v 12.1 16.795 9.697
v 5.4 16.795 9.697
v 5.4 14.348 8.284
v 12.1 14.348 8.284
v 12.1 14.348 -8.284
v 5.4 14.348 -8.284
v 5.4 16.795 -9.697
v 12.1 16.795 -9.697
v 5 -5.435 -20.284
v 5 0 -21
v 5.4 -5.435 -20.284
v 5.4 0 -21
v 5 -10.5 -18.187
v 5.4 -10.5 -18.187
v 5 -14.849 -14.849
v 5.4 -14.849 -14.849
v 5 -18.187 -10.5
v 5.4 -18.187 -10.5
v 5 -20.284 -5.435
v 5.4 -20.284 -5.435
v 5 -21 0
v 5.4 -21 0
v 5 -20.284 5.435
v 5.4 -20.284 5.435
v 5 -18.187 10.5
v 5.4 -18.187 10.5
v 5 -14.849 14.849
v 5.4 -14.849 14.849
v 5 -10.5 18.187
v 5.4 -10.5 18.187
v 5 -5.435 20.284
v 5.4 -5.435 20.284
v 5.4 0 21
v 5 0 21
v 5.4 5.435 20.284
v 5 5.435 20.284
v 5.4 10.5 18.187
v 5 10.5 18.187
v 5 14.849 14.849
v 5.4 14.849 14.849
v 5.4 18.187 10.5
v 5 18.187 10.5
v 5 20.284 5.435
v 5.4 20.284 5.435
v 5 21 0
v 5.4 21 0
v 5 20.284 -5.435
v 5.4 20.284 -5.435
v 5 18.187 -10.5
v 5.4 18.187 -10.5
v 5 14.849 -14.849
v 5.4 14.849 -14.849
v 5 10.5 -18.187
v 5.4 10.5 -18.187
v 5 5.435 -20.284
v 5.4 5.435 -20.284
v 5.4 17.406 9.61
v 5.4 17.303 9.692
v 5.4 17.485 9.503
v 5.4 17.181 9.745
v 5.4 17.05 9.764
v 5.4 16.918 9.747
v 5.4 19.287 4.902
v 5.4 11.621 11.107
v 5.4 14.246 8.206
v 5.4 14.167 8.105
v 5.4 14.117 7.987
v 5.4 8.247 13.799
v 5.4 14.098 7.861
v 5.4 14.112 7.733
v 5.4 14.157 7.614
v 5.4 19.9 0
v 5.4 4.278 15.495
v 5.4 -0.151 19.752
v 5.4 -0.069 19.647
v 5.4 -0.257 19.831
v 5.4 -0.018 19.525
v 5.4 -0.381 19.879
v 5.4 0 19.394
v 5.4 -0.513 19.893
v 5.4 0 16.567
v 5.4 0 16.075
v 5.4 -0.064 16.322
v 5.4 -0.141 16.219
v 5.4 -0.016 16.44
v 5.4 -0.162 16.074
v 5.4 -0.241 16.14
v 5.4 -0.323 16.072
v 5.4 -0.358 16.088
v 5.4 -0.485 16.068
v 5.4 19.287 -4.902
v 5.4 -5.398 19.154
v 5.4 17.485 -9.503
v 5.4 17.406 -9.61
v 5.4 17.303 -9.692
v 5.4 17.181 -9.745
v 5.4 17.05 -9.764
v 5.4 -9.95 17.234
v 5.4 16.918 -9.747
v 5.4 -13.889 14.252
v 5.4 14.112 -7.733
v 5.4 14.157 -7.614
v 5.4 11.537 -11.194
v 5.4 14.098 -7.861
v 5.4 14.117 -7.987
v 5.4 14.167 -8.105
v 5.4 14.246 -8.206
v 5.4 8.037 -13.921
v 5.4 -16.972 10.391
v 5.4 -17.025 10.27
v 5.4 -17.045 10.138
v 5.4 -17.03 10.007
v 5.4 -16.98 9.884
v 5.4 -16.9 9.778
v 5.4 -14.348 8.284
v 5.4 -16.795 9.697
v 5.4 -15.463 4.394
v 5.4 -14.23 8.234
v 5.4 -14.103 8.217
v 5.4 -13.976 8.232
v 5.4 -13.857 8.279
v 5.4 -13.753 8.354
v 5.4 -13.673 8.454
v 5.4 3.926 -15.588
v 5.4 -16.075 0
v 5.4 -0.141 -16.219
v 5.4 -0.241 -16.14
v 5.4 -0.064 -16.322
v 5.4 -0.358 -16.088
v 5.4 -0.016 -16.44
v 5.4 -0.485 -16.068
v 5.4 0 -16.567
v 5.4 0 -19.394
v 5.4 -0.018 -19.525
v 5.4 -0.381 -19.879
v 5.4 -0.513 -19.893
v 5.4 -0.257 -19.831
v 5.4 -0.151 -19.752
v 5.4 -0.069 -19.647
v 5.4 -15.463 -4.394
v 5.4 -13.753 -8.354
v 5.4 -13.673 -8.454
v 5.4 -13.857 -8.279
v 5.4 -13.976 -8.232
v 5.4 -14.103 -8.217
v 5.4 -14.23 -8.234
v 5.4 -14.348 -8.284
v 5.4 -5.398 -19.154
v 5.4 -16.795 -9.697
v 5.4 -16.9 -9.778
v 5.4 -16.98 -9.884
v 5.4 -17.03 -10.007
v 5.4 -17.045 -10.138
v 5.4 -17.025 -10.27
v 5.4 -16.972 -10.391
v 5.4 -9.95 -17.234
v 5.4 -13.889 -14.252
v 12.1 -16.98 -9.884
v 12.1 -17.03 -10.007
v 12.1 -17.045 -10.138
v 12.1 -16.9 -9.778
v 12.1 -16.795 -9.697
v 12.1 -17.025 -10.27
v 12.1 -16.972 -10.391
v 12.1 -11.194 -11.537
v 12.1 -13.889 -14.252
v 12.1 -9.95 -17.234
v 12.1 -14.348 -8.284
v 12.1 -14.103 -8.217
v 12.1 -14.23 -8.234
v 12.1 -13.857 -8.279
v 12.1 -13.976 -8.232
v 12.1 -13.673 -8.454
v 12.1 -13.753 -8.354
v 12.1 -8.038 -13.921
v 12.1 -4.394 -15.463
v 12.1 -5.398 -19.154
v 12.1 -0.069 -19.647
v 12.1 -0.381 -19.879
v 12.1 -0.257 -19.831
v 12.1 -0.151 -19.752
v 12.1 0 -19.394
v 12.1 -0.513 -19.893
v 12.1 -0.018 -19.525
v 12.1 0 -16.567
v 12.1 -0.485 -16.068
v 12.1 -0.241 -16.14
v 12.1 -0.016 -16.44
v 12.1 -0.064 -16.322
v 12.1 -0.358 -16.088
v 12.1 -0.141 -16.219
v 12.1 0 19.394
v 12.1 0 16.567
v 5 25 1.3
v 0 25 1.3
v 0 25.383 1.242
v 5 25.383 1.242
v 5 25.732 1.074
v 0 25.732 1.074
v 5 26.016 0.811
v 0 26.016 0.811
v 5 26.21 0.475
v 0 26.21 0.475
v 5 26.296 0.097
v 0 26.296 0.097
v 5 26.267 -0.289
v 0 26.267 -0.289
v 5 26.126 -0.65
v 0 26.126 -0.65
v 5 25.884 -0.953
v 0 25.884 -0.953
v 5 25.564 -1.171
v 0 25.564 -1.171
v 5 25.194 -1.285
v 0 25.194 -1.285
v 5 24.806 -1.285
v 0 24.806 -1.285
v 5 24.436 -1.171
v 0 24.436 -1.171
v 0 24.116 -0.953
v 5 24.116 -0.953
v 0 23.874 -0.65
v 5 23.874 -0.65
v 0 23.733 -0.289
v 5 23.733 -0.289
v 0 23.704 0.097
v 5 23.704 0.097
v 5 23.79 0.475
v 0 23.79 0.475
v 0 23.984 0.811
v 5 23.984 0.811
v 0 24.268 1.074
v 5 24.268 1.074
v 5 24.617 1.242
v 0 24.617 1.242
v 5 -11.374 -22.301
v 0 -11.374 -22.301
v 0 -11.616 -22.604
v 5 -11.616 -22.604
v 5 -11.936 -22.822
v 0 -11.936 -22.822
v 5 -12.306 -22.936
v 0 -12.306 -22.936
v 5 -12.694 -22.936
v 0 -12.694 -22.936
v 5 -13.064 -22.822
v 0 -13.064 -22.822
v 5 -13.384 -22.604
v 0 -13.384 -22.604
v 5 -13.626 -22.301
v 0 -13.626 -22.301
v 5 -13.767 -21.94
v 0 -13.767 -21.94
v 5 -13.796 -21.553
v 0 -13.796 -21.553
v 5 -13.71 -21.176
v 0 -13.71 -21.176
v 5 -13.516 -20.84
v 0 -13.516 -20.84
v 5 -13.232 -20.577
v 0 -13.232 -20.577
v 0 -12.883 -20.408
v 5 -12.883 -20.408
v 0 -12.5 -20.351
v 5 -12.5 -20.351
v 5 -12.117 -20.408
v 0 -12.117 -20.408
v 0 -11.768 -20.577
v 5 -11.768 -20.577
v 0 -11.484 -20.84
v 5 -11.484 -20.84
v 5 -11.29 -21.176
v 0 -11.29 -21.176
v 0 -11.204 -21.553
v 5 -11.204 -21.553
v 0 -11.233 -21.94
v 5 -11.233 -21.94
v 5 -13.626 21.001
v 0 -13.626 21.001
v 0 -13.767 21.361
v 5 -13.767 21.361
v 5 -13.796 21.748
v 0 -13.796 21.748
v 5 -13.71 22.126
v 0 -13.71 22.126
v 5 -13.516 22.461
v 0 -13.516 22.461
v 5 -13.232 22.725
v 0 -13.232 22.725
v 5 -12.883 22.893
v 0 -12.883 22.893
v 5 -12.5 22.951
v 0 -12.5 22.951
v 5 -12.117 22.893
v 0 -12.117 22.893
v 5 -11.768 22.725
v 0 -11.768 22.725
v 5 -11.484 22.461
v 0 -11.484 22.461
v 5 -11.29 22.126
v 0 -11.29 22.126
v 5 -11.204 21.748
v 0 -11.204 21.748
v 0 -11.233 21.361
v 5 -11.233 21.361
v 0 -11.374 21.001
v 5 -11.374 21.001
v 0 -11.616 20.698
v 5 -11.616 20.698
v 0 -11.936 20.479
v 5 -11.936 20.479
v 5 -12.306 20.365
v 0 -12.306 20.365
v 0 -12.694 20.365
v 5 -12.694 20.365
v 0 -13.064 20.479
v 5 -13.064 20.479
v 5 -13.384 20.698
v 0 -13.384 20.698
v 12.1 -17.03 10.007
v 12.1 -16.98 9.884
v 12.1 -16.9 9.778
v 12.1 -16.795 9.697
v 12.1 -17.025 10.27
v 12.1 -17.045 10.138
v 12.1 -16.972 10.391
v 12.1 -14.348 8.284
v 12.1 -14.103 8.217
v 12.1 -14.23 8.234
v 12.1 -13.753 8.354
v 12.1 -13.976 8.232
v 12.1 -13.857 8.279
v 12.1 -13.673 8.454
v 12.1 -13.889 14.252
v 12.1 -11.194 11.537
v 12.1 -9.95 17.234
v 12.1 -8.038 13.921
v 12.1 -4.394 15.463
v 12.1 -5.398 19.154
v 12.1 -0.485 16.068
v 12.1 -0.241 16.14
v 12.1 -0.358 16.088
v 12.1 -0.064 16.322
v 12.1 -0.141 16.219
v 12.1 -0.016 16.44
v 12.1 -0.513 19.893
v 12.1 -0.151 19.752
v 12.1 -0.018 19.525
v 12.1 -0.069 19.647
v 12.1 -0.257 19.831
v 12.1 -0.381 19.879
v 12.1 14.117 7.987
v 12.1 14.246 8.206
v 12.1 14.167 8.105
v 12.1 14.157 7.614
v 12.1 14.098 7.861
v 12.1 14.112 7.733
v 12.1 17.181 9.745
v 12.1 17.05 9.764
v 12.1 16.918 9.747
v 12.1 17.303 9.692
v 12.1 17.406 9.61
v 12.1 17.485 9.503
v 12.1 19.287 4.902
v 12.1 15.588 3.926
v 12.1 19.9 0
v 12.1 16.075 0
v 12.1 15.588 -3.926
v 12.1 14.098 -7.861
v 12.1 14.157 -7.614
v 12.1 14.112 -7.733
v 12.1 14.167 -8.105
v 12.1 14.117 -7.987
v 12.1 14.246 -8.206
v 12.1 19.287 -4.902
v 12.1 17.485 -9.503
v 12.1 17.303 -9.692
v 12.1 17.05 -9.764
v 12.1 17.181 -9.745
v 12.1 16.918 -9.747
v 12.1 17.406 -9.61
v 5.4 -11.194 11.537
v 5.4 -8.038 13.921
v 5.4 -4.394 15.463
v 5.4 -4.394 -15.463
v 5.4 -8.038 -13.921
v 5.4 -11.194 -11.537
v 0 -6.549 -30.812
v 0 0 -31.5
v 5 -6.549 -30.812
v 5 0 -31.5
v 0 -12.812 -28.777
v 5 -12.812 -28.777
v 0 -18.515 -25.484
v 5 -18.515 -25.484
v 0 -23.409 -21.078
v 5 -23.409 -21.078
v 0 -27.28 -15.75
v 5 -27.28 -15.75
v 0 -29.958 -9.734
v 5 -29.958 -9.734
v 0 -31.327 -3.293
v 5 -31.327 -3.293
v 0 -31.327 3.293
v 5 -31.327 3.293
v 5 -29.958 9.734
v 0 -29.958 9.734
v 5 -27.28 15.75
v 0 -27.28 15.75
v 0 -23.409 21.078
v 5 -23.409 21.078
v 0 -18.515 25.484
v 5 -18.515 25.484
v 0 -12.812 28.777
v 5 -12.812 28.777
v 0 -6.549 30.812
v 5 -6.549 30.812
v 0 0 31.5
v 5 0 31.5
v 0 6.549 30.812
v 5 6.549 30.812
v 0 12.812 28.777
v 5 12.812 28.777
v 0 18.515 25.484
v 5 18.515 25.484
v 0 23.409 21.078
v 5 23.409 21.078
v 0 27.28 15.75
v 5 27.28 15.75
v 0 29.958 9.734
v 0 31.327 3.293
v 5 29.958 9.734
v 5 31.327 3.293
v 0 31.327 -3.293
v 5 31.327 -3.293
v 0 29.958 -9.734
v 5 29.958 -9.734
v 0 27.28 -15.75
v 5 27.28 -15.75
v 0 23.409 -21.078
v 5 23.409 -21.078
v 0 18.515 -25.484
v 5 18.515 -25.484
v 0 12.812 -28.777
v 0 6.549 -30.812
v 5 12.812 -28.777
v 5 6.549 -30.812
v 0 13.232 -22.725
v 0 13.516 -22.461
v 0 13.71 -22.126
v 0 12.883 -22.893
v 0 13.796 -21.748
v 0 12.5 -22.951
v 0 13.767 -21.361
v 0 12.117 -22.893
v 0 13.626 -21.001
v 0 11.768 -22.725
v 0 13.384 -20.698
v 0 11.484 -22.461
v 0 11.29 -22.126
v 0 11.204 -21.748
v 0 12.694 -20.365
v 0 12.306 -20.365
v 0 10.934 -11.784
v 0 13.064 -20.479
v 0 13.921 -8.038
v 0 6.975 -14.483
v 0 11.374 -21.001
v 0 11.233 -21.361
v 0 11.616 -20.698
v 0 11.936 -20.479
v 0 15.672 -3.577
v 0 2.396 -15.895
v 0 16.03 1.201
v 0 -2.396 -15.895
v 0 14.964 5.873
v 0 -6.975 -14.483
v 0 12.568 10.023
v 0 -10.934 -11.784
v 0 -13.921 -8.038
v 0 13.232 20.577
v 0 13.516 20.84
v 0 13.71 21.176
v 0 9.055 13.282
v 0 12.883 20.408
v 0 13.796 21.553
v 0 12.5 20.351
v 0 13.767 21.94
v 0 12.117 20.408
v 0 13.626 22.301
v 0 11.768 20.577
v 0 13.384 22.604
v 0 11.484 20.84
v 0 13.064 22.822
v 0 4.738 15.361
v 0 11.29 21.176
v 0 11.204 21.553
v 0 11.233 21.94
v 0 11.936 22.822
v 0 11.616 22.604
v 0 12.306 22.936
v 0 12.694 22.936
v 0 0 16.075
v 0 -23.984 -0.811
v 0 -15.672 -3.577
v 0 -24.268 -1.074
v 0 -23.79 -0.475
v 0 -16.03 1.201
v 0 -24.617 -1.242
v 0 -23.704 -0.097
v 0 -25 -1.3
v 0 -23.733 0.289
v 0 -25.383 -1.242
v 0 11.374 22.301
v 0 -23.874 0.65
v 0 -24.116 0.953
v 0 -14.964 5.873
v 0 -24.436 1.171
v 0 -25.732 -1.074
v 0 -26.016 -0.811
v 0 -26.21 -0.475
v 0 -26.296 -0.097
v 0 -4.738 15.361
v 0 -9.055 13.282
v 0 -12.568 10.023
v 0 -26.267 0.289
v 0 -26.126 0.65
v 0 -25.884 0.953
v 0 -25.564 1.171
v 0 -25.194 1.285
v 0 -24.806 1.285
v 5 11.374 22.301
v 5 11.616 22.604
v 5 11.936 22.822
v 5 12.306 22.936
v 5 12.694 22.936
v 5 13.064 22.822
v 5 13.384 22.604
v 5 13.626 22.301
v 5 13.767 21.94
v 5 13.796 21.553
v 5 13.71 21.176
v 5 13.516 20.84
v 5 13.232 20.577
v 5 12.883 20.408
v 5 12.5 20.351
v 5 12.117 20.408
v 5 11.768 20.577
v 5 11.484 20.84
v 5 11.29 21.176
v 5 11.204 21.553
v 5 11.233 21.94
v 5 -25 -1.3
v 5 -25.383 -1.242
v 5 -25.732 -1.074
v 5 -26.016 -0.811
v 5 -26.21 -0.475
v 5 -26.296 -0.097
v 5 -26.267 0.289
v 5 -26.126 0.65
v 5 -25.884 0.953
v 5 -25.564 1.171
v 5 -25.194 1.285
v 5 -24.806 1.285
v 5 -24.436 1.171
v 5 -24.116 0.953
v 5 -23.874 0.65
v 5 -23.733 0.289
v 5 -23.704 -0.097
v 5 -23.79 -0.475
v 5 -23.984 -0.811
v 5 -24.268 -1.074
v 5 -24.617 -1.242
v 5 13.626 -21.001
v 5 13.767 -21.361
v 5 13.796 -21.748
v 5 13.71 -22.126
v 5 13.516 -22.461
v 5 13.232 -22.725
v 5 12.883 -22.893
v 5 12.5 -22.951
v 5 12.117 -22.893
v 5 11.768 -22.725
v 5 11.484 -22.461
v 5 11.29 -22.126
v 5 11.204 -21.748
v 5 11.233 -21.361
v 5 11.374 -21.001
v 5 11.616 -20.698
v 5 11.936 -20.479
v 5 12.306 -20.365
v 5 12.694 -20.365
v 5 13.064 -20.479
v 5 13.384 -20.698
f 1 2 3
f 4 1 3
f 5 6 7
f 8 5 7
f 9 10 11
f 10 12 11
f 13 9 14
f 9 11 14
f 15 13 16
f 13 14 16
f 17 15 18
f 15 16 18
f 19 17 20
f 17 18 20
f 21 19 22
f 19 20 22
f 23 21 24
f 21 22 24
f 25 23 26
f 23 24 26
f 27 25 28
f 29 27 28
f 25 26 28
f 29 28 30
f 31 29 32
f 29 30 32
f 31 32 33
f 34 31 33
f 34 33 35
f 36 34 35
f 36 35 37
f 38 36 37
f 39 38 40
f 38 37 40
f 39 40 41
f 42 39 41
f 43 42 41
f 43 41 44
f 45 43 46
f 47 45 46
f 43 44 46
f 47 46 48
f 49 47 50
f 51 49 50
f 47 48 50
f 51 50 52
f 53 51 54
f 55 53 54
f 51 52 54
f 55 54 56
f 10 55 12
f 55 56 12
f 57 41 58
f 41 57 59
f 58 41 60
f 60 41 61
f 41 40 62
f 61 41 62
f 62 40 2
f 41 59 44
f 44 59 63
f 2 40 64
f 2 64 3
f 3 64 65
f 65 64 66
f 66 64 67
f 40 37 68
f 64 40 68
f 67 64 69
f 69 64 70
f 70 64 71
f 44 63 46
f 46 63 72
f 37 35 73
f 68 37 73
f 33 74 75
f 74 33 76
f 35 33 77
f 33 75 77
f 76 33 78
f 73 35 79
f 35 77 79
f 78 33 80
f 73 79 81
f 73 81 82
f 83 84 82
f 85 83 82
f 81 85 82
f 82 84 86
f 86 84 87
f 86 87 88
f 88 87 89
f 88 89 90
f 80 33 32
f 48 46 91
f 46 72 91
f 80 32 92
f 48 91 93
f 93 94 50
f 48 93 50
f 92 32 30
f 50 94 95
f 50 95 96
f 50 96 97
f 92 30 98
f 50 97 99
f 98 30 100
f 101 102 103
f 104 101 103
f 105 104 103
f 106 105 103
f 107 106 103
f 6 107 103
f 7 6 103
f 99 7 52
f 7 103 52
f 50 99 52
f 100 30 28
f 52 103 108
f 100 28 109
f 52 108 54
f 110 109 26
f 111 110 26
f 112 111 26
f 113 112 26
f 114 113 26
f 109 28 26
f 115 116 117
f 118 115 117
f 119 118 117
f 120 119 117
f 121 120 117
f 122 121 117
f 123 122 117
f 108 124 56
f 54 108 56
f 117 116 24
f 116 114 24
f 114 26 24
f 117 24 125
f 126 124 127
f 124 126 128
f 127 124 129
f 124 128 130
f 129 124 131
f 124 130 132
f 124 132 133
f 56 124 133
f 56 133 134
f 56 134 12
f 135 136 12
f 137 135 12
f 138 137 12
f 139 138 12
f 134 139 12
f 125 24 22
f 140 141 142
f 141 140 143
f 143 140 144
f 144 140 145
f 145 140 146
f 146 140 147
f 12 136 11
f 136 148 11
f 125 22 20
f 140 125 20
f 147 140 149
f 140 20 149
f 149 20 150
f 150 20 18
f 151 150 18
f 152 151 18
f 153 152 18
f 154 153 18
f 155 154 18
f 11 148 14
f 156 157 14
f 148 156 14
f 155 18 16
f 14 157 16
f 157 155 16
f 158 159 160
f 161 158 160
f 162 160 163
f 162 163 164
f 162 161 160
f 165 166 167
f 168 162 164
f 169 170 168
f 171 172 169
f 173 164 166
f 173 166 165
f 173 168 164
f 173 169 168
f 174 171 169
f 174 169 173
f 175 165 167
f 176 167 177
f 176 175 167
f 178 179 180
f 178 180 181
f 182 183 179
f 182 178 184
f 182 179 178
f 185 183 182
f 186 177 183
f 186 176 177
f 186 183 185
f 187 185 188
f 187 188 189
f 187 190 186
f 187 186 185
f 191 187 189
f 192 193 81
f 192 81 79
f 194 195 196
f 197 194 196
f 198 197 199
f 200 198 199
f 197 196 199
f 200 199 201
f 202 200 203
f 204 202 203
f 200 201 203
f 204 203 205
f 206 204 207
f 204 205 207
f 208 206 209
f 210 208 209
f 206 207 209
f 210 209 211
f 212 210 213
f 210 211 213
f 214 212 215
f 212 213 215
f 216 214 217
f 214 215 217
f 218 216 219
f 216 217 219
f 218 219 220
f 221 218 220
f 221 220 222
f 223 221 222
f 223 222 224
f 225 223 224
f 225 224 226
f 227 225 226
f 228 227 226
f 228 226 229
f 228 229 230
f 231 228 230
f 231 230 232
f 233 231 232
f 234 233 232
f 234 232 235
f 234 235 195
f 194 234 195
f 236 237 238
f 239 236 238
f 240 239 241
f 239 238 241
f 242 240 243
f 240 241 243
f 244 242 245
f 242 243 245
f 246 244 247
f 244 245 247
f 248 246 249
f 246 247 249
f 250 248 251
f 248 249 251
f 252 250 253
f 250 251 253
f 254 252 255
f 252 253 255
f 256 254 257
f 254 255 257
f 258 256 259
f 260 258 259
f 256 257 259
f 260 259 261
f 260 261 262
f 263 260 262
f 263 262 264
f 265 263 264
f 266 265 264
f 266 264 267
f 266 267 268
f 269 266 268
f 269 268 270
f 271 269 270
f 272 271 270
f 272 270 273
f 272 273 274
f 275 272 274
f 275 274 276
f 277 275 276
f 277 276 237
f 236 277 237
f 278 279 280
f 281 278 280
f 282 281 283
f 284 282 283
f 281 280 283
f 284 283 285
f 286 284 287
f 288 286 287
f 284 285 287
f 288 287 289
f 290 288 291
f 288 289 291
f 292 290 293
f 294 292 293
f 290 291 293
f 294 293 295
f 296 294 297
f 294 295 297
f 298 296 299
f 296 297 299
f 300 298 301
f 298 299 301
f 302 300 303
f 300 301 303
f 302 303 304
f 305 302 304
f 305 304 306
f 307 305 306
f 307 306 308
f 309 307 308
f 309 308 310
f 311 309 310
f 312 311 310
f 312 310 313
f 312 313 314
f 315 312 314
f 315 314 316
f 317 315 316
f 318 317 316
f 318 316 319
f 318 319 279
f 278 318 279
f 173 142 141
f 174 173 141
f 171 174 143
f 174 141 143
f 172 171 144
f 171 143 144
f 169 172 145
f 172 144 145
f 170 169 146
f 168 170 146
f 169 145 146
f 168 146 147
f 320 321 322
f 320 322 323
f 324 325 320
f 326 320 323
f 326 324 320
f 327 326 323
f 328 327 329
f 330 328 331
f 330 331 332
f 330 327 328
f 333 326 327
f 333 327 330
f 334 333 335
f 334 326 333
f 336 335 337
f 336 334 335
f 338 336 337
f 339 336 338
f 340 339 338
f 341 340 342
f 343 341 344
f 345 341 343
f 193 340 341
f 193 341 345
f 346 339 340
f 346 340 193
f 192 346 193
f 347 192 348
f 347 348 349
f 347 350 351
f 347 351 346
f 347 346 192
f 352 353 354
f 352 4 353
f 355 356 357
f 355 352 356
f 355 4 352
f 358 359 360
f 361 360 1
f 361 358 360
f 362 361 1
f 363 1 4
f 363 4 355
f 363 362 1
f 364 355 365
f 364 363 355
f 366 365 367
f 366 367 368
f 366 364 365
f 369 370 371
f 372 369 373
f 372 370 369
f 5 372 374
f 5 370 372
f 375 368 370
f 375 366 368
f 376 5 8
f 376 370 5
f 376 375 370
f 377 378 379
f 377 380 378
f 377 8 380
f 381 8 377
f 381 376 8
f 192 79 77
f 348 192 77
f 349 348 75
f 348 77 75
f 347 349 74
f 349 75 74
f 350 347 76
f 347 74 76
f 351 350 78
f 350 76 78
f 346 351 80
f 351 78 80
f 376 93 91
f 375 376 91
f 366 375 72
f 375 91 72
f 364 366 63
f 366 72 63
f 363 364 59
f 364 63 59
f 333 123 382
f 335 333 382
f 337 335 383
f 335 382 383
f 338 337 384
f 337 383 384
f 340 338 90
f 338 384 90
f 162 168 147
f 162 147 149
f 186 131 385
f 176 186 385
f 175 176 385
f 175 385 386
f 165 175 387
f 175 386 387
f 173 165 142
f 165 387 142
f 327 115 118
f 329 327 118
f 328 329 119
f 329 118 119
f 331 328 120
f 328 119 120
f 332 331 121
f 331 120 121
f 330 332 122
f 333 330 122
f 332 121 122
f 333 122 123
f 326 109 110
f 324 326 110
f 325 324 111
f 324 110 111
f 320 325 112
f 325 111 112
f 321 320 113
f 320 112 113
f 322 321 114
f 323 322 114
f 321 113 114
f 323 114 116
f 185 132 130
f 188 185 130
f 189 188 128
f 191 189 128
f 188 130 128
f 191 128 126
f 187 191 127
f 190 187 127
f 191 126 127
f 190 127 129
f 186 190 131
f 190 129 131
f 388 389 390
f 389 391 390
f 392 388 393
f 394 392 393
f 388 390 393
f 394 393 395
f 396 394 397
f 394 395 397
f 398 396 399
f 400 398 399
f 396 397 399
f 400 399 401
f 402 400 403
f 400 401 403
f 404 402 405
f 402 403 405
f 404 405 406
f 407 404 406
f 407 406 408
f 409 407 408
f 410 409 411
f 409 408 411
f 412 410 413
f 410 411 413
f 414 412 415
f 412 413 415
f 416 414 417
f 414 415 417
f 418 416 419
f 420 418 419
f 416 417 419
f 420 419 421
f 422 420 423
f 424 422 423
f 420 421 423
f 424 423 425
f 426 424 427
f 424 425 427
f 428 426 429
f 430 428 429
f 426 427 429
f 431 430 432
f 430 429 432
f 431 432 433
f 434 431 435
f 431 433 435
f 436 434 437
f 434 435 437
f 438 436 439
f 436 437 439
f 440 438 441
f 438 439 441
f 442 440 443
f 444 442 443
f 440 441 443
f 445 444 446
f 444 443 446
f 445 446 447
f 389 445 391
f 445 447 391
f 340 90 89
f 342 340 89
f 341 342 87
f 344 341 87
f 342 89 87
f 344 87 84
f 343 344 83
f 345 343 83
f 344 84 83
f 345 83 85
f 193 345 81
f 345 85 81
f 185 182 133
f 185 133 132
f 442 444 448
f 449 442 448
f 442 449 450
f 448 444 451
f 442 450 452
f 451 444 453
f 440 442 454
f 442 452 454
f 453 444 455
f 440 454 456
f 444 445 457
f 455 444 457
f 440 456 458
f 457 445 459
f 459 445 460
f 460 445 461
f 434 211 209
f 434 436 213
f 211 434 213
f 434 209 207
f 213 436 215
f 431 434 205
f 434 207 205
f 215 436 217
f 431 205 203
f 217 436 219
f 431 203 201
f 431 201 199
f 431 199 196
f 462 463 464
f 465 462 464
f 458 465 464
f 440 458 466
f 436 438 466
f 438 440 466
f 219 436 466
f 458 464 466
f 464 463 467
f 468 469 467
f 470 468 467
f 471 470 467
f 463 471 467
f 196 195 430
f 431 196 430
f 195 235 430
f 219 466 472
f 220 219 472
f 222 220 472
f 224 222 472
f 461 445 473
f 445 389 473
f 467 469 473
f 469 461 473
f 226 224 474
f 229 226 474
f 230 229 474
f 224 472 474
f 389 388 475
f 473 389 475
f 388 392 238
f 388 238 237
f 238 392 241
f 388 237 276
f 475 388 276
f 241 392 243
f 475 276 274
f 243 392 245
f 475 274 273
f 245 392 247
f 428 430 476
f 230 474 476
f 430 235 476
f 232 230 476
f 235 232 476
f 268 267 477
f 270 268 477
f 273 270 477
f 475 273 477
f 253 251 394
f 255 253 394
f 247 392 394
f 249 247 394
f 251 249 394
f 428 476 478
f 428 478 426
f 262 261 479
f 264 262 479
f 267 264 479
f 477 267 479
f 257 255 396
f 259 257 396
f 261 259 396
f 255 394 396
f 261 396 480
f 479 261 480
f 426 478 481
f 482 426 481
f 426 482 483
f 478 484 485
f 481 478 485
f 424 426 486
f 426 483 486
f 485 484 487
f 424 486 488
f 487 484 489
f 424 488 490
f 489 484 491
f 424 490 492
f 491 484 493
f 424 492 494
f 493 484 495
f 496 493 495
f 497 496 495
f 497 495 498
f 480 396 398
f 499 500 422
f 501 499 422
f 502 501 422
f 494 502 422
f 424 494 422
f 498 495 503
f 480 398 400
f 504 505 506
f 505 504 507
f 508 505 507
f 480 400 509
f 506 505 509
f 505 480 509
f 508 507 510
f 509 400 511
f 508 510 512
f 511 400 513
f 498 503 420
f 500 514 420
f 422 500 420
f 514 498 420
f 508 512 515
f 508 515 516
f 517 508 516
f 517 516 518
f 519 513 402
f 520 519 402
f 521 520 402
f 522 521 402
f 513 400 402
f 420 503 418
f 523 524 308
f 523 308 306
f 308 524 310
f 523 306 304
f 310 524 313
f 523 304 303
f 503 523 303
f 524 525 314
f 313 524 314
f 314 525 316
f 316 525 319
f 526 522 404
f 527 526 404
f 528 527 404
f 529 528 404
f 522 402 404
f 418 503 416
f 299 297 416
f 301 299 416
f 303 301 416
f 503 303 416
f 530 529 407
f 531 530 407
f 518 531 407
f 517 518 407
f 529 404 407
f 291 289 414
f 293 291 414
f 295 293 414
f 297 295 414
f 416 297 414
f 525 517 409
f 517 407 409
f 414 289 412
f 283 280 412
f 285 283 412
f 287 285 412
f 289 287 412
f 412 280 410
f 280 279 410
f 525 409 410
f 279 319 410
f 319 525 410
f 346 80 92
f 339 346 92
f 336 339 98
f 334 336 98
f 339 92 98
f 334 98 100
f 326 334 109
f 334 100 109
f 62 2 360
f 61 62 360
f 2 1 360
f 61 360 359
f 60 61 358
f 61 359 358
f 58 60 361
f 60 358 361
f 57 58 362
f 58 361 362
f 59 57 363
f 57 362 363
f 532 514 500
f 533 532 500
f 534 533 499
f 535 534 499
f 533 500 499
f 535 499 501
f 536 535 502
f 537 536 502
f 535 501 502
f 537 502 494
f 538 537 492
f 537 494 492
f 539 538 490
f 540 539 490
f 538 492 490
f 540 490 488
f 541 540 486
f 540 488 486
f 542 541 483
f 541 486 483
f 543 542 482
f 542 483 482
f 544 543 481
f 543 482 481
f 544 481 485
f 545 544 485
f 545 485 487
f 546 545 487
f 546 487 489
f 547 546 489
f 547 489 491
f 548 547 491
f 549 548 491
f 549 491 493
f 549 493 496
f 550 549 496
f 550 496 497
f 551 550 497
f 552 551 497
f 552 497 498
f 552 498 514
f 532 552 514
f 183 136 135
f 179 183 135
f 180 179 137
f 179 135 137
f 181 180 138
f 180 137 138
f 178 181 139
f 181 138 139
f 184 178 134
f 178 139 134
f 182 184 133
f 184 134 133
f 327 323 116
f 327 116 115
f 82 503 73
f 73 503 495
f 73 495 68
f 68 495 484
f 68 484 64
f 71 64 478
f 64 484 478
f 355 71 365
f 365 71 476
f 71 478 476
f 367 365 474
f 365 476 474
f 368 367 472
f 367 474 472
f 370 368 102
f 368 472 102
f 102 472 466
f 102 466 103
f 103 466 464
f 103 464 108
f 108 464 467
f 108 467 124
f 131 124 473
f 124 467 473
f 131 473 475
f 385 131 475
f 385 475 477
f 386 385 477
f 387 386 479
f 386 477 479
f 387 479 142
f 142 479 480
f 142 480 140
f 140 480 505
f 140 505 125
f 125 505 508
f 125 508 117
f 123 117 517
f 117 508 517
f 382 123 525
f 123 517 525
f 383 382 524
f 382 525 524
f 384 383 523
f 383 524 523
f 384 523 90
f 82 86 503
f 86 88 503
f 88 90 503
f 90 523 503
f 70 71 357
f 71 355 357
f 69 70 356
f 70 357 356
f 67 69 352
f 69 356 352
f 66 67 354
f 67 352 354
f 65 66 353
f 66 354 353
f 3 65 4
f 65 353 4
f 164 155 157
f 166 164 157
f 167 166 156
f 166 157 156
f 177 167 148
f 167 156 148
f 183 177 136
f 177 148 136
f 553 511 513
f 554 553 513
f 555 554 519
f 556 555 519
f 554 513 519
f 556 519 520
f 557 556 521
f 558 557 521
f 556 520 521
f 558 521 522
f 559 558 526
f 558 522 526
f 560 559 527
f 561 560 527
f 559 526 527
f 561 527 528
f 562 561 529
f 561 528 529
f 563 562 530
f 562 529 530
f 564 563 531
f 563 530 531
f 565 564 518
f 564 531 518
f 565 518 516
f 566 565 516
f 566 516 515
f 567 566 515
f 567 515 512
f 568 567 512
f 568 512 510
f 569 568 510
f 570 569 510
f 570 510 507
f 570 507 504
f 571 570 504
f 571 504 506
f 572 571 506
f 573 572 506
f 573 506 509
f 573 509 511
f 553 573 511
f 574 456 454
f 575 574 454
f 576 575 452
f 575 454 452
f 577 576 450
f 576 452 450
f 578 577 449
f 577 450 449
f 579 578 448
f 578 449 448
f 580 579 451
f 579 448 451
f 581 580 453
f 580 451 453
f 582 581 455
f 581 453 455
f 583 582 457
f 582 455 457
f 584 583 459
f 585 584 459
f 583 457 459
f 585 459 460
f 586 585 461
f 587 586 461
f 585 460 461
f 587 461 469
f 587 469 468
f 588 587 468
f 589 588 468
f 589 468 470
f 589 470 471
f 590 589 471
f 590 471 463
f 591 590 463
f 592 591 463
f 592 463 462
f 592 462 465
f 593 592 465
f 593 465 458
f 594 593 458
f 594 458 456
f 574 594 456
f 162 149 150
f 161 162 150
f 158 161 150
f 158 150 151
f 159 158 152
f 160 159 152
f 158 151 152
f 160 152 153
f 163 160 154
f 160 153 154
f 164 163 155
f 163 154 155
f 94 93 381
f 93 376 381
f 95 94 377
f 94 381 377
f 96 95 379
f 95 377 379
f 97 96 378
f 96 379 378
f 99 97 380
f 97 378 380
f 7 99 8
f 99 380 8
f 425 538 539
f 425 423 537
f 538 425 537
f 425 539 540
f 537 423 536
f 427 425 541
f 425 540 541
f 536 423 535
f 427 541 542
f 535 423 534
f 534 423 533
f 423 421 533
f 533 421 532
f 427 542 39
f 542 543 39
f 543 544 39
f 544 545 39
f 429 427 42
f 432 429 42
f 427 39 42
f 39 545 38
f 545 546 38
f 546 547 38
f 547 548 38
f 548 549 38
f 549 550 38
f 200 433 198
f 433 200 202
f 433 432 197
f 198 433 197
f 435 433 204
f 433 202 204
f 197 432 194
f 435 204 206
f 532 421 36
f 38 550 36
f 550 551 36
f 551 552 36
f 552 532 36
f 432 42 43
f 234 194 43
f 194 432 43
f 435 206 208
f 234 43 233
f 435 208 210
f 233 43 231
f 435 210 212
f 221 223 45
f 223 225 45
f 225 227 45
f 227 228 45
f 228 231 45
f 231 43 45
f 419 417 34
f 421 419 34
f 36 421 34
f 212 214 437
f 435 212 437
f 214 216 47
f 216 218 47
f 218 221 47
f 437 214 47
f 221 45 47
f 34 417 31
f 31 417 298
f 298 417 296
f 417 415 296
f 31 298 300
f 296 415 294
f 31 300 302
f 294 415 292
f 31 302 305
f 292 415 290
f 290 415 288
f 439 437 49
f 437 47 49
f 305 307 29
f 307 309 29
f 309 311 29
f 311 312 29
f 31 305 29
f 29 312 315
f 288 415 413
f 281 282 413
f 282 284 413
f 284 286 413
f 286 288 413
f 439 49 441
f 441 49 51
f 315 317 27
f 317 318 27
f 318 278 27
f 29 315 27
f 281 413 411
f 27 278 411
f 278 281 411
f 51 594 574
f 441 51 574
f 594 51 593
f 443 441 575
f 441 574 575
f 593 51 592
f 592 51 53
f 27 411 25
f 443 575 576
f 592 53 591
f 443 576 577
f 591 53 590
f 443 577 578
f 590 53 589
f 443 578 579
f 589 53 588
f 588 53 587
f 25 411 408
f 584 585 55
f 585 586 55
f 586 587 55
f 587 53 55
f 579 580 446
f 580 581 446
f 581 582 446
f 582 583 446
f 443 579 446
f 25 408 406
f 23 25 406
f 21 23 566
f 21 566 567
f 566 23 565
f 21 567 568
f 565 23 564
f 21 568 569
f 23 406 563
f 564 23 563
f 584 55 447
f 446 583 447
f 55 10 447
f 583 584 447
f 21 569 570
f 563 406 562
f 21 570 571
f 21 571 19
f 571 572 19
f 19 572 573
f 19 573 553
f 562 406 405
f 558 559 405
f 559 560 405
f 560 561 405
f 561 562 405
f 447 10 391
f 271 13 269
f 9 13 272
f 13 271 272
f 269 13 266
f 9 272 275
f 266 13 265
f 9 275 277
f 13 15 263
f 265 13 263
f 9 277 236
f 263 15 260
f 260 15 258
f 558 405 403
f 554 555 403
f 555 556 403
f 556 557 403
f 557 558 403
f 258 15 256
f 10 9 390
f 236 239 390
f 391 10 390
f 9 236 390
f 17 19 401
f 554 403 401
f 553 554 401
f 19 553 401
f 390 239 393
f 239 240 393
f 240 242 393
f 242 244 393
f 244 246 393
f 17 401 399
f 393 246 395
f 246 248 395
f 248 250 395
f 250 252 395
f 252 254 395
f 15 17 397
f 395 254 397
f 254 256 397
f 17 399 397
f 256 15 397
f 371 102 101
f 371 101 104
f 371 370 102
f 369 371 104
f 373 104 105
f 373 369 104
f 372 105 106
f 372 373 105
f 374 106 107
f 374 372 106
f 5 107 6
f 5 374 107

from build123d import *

# Parameters (mm, degrees)
SKIZZE2_R                        = 16.075
SCHNITT_LINEAR_AUSTRAGEN1_DEPTH  = 45.873823104344474
F_2_6_2_6_DURCHMESSER_BOHRUNG1_D = 2.6
KREISMUSTER1_COUNT               = 6
AUFSATZ_LINEAR_AUSTRAGEN1_DEPTH  = 6.7
VERRUNDUNG1_R                    = 0.5
KREISMUSTER2_START               = 5.4
KREISMUSTER2_DEPTH               = 6.7


# Read off the part's stored shape, not the designer's step: Kreismuster2
with BuildPart() as part:
    # Skizze1 → Rotation1 (revolve)
    with BuildSketch(Plane.XY, mode=Mode.PRIVATE) as rotation1_sk:
        Polygon((0, 0), (0, 31.5), (4.999999999999999, 31.5), (5.000000000000001, 20.999999999999996), (5.4, 21), (5.4, 0), align=None)
    revolve(rotation1_sk.sketch.rotate(Axis((0, 0, 0), (-1, 0, 0)), 90), axis=Axis((0, 0, 0), (-1, 0, 0)))

    # Skizze2 → Schnitt-Linear austragen1 (cut, through all)
    with BuildSketch(Plane.ZY):
        Circle(SKIZZE2_R)
    extrude(amount=-SCHNITT_LINEAR_AUSTRAGEN1_DEPTH, mode=Mode.SUBTRACT)

    # Ø2.6 (2.6) Durchmesser Bohrung1 (through all)
    with Locations(Plane(origin=(5, 0, 0), x_dir=(0, 0, -1), z_dir=(1, 0, 0))):
        with Locations((0, 25)):
            f_2_6_2_6_durchmesser_bohrung1 = Hole(F_2_6_2_6_DURCHMESSER_BOHRUNG1_D / 2)

    # Kreismuster1: Ø2.6 (2.6) Durchmesser Bohrung1 ×6 about axis
    kreismuster1_axis = Axis((0, -7.2e-16, -2.984e-14), (1, 0, 0))
    for i in range(1, KREISMUSTER1_COUNT):
        add(f_2_6_2_6_durchmesser_bohrung1.rotate(kreismuster1_axis, i * 360 / KREISMUSTER1_COUNT), mode=Mode.SUBTRACT)

    # Skizze5 → Aufsatz-Linear austragen1 (add)
    with BuildSketch(Plane(origin=(5.4, 0, 0), x_dir=(0, 0, -1), z_dir=(1, 0, 0))):
        with BuildLine():
            Line((-9.950000000000019, 17.233905535310317), (-8.037500000000017, 13.921358365834841))
            ThreePointArc((-8.037500000000017, 13.921358365834841), (9.8e-16, 16.075), (8.037500000000014, 13.921358365834843))
            Line((8.037500000000014, 13.921358365834843), (9.950000000000017, 17.233905535310317))
            ThreePointArc((9.950000000000017, 17.233905535310317), (1.22e-15, 19.9), (-9.950000000000019, 17.233905535310317))
        make_face()
    extrude(amount=AUFSATZ_LINEAR_AUSTRAGEN1_DEPTH)

    # Verrundung1
    verrundung1_edges = [part.edges().sort_by_distance(p)[0] for p in [
        (8.75, 17.233905535310317, -9.950000000000015),
        (8.75, 17.23390553531032, 9.950000000000017),
        (8.75, 13.921358365834843, 8.03750000000002),
        (8.75, 13.921358365834845, -8.037500000000014),
    ]]
    fillet(verrundung1_edges, radius=VERRUNDUNG1_R)

    # Kreismuster2 outline → Kreismuster2 (add)
    with BuildSketch(Plane.YZ.offset(KREISMUSTER2_START)):
        with BuildLine():
            ThreePointArc((-13.672564308, 8.453792655), (-8.0375, 13.921358366), (-0.484917044, 16.067684353))
            ThreePointArc((-0.484917044, 16.067684353), (-0.1411536, 16.219276879), (0, 16.567456805))
            Line((0, 16.567456805), (0, 19.393555631))
            ThreePointArc((0, 19.393555631), (-0.151032451, 19.751636138), (-0.512886598, 19.893389539))
            ThreePointArc((-0.512886598, 19.893389539), (-9.95, 17.233905535), (-16.971737409, 10.390867592))
            ThreePointArc((-16.971737409, 10.390867592), (-17.029902436, 10.006616008), (-16.795311846, 9.696777815))
            Line((-16.795311846, 9.696777815), (-14.34783847, 8.283728403))
            ThreePointArc((-14.34783847, 8.283728403), (-13.975729009, 8.231881043), (-13.672564308, 8.453792655))
        make_face()
        with BuildLine():
            ThreePointArc((0, -16.567456805), (-0.1411536, -16.219276879), (-0.484917044, -16.067684353))
            ThreePointArc((-0.484917044, -16.067684353), (-8.0375, -13.921358366), (-13.672564308, -8.453792655))
            ThreePointArc((-13.672564308, -8.453792655), (-13.975729009, -8.231881043), (-14.34783847, -8.283728403))
            Line((-14.34783847, -8.283728403), (-16.795311846, -9.696777815))
            ThreePointArc((-16.795311846, -9.696777815), (-17.029902436, -10.006616008), (-16.971737409, -10.390867592))
            ThreePointArc((-16.971737409, -10.390867592), (-9.95, -17.233905535), (-0.512886598, -19.893389539))
            ThreePointArc((-0.512886598, -19.893389539), (-0.151032451, -19.751636138), (0, -19.393555631))
            Line((0, -19.393555631), (0, -16.567456805))
        make_face()
    extrude(amount=KREISMUSTER2_DEPTH)


solid = part.part
